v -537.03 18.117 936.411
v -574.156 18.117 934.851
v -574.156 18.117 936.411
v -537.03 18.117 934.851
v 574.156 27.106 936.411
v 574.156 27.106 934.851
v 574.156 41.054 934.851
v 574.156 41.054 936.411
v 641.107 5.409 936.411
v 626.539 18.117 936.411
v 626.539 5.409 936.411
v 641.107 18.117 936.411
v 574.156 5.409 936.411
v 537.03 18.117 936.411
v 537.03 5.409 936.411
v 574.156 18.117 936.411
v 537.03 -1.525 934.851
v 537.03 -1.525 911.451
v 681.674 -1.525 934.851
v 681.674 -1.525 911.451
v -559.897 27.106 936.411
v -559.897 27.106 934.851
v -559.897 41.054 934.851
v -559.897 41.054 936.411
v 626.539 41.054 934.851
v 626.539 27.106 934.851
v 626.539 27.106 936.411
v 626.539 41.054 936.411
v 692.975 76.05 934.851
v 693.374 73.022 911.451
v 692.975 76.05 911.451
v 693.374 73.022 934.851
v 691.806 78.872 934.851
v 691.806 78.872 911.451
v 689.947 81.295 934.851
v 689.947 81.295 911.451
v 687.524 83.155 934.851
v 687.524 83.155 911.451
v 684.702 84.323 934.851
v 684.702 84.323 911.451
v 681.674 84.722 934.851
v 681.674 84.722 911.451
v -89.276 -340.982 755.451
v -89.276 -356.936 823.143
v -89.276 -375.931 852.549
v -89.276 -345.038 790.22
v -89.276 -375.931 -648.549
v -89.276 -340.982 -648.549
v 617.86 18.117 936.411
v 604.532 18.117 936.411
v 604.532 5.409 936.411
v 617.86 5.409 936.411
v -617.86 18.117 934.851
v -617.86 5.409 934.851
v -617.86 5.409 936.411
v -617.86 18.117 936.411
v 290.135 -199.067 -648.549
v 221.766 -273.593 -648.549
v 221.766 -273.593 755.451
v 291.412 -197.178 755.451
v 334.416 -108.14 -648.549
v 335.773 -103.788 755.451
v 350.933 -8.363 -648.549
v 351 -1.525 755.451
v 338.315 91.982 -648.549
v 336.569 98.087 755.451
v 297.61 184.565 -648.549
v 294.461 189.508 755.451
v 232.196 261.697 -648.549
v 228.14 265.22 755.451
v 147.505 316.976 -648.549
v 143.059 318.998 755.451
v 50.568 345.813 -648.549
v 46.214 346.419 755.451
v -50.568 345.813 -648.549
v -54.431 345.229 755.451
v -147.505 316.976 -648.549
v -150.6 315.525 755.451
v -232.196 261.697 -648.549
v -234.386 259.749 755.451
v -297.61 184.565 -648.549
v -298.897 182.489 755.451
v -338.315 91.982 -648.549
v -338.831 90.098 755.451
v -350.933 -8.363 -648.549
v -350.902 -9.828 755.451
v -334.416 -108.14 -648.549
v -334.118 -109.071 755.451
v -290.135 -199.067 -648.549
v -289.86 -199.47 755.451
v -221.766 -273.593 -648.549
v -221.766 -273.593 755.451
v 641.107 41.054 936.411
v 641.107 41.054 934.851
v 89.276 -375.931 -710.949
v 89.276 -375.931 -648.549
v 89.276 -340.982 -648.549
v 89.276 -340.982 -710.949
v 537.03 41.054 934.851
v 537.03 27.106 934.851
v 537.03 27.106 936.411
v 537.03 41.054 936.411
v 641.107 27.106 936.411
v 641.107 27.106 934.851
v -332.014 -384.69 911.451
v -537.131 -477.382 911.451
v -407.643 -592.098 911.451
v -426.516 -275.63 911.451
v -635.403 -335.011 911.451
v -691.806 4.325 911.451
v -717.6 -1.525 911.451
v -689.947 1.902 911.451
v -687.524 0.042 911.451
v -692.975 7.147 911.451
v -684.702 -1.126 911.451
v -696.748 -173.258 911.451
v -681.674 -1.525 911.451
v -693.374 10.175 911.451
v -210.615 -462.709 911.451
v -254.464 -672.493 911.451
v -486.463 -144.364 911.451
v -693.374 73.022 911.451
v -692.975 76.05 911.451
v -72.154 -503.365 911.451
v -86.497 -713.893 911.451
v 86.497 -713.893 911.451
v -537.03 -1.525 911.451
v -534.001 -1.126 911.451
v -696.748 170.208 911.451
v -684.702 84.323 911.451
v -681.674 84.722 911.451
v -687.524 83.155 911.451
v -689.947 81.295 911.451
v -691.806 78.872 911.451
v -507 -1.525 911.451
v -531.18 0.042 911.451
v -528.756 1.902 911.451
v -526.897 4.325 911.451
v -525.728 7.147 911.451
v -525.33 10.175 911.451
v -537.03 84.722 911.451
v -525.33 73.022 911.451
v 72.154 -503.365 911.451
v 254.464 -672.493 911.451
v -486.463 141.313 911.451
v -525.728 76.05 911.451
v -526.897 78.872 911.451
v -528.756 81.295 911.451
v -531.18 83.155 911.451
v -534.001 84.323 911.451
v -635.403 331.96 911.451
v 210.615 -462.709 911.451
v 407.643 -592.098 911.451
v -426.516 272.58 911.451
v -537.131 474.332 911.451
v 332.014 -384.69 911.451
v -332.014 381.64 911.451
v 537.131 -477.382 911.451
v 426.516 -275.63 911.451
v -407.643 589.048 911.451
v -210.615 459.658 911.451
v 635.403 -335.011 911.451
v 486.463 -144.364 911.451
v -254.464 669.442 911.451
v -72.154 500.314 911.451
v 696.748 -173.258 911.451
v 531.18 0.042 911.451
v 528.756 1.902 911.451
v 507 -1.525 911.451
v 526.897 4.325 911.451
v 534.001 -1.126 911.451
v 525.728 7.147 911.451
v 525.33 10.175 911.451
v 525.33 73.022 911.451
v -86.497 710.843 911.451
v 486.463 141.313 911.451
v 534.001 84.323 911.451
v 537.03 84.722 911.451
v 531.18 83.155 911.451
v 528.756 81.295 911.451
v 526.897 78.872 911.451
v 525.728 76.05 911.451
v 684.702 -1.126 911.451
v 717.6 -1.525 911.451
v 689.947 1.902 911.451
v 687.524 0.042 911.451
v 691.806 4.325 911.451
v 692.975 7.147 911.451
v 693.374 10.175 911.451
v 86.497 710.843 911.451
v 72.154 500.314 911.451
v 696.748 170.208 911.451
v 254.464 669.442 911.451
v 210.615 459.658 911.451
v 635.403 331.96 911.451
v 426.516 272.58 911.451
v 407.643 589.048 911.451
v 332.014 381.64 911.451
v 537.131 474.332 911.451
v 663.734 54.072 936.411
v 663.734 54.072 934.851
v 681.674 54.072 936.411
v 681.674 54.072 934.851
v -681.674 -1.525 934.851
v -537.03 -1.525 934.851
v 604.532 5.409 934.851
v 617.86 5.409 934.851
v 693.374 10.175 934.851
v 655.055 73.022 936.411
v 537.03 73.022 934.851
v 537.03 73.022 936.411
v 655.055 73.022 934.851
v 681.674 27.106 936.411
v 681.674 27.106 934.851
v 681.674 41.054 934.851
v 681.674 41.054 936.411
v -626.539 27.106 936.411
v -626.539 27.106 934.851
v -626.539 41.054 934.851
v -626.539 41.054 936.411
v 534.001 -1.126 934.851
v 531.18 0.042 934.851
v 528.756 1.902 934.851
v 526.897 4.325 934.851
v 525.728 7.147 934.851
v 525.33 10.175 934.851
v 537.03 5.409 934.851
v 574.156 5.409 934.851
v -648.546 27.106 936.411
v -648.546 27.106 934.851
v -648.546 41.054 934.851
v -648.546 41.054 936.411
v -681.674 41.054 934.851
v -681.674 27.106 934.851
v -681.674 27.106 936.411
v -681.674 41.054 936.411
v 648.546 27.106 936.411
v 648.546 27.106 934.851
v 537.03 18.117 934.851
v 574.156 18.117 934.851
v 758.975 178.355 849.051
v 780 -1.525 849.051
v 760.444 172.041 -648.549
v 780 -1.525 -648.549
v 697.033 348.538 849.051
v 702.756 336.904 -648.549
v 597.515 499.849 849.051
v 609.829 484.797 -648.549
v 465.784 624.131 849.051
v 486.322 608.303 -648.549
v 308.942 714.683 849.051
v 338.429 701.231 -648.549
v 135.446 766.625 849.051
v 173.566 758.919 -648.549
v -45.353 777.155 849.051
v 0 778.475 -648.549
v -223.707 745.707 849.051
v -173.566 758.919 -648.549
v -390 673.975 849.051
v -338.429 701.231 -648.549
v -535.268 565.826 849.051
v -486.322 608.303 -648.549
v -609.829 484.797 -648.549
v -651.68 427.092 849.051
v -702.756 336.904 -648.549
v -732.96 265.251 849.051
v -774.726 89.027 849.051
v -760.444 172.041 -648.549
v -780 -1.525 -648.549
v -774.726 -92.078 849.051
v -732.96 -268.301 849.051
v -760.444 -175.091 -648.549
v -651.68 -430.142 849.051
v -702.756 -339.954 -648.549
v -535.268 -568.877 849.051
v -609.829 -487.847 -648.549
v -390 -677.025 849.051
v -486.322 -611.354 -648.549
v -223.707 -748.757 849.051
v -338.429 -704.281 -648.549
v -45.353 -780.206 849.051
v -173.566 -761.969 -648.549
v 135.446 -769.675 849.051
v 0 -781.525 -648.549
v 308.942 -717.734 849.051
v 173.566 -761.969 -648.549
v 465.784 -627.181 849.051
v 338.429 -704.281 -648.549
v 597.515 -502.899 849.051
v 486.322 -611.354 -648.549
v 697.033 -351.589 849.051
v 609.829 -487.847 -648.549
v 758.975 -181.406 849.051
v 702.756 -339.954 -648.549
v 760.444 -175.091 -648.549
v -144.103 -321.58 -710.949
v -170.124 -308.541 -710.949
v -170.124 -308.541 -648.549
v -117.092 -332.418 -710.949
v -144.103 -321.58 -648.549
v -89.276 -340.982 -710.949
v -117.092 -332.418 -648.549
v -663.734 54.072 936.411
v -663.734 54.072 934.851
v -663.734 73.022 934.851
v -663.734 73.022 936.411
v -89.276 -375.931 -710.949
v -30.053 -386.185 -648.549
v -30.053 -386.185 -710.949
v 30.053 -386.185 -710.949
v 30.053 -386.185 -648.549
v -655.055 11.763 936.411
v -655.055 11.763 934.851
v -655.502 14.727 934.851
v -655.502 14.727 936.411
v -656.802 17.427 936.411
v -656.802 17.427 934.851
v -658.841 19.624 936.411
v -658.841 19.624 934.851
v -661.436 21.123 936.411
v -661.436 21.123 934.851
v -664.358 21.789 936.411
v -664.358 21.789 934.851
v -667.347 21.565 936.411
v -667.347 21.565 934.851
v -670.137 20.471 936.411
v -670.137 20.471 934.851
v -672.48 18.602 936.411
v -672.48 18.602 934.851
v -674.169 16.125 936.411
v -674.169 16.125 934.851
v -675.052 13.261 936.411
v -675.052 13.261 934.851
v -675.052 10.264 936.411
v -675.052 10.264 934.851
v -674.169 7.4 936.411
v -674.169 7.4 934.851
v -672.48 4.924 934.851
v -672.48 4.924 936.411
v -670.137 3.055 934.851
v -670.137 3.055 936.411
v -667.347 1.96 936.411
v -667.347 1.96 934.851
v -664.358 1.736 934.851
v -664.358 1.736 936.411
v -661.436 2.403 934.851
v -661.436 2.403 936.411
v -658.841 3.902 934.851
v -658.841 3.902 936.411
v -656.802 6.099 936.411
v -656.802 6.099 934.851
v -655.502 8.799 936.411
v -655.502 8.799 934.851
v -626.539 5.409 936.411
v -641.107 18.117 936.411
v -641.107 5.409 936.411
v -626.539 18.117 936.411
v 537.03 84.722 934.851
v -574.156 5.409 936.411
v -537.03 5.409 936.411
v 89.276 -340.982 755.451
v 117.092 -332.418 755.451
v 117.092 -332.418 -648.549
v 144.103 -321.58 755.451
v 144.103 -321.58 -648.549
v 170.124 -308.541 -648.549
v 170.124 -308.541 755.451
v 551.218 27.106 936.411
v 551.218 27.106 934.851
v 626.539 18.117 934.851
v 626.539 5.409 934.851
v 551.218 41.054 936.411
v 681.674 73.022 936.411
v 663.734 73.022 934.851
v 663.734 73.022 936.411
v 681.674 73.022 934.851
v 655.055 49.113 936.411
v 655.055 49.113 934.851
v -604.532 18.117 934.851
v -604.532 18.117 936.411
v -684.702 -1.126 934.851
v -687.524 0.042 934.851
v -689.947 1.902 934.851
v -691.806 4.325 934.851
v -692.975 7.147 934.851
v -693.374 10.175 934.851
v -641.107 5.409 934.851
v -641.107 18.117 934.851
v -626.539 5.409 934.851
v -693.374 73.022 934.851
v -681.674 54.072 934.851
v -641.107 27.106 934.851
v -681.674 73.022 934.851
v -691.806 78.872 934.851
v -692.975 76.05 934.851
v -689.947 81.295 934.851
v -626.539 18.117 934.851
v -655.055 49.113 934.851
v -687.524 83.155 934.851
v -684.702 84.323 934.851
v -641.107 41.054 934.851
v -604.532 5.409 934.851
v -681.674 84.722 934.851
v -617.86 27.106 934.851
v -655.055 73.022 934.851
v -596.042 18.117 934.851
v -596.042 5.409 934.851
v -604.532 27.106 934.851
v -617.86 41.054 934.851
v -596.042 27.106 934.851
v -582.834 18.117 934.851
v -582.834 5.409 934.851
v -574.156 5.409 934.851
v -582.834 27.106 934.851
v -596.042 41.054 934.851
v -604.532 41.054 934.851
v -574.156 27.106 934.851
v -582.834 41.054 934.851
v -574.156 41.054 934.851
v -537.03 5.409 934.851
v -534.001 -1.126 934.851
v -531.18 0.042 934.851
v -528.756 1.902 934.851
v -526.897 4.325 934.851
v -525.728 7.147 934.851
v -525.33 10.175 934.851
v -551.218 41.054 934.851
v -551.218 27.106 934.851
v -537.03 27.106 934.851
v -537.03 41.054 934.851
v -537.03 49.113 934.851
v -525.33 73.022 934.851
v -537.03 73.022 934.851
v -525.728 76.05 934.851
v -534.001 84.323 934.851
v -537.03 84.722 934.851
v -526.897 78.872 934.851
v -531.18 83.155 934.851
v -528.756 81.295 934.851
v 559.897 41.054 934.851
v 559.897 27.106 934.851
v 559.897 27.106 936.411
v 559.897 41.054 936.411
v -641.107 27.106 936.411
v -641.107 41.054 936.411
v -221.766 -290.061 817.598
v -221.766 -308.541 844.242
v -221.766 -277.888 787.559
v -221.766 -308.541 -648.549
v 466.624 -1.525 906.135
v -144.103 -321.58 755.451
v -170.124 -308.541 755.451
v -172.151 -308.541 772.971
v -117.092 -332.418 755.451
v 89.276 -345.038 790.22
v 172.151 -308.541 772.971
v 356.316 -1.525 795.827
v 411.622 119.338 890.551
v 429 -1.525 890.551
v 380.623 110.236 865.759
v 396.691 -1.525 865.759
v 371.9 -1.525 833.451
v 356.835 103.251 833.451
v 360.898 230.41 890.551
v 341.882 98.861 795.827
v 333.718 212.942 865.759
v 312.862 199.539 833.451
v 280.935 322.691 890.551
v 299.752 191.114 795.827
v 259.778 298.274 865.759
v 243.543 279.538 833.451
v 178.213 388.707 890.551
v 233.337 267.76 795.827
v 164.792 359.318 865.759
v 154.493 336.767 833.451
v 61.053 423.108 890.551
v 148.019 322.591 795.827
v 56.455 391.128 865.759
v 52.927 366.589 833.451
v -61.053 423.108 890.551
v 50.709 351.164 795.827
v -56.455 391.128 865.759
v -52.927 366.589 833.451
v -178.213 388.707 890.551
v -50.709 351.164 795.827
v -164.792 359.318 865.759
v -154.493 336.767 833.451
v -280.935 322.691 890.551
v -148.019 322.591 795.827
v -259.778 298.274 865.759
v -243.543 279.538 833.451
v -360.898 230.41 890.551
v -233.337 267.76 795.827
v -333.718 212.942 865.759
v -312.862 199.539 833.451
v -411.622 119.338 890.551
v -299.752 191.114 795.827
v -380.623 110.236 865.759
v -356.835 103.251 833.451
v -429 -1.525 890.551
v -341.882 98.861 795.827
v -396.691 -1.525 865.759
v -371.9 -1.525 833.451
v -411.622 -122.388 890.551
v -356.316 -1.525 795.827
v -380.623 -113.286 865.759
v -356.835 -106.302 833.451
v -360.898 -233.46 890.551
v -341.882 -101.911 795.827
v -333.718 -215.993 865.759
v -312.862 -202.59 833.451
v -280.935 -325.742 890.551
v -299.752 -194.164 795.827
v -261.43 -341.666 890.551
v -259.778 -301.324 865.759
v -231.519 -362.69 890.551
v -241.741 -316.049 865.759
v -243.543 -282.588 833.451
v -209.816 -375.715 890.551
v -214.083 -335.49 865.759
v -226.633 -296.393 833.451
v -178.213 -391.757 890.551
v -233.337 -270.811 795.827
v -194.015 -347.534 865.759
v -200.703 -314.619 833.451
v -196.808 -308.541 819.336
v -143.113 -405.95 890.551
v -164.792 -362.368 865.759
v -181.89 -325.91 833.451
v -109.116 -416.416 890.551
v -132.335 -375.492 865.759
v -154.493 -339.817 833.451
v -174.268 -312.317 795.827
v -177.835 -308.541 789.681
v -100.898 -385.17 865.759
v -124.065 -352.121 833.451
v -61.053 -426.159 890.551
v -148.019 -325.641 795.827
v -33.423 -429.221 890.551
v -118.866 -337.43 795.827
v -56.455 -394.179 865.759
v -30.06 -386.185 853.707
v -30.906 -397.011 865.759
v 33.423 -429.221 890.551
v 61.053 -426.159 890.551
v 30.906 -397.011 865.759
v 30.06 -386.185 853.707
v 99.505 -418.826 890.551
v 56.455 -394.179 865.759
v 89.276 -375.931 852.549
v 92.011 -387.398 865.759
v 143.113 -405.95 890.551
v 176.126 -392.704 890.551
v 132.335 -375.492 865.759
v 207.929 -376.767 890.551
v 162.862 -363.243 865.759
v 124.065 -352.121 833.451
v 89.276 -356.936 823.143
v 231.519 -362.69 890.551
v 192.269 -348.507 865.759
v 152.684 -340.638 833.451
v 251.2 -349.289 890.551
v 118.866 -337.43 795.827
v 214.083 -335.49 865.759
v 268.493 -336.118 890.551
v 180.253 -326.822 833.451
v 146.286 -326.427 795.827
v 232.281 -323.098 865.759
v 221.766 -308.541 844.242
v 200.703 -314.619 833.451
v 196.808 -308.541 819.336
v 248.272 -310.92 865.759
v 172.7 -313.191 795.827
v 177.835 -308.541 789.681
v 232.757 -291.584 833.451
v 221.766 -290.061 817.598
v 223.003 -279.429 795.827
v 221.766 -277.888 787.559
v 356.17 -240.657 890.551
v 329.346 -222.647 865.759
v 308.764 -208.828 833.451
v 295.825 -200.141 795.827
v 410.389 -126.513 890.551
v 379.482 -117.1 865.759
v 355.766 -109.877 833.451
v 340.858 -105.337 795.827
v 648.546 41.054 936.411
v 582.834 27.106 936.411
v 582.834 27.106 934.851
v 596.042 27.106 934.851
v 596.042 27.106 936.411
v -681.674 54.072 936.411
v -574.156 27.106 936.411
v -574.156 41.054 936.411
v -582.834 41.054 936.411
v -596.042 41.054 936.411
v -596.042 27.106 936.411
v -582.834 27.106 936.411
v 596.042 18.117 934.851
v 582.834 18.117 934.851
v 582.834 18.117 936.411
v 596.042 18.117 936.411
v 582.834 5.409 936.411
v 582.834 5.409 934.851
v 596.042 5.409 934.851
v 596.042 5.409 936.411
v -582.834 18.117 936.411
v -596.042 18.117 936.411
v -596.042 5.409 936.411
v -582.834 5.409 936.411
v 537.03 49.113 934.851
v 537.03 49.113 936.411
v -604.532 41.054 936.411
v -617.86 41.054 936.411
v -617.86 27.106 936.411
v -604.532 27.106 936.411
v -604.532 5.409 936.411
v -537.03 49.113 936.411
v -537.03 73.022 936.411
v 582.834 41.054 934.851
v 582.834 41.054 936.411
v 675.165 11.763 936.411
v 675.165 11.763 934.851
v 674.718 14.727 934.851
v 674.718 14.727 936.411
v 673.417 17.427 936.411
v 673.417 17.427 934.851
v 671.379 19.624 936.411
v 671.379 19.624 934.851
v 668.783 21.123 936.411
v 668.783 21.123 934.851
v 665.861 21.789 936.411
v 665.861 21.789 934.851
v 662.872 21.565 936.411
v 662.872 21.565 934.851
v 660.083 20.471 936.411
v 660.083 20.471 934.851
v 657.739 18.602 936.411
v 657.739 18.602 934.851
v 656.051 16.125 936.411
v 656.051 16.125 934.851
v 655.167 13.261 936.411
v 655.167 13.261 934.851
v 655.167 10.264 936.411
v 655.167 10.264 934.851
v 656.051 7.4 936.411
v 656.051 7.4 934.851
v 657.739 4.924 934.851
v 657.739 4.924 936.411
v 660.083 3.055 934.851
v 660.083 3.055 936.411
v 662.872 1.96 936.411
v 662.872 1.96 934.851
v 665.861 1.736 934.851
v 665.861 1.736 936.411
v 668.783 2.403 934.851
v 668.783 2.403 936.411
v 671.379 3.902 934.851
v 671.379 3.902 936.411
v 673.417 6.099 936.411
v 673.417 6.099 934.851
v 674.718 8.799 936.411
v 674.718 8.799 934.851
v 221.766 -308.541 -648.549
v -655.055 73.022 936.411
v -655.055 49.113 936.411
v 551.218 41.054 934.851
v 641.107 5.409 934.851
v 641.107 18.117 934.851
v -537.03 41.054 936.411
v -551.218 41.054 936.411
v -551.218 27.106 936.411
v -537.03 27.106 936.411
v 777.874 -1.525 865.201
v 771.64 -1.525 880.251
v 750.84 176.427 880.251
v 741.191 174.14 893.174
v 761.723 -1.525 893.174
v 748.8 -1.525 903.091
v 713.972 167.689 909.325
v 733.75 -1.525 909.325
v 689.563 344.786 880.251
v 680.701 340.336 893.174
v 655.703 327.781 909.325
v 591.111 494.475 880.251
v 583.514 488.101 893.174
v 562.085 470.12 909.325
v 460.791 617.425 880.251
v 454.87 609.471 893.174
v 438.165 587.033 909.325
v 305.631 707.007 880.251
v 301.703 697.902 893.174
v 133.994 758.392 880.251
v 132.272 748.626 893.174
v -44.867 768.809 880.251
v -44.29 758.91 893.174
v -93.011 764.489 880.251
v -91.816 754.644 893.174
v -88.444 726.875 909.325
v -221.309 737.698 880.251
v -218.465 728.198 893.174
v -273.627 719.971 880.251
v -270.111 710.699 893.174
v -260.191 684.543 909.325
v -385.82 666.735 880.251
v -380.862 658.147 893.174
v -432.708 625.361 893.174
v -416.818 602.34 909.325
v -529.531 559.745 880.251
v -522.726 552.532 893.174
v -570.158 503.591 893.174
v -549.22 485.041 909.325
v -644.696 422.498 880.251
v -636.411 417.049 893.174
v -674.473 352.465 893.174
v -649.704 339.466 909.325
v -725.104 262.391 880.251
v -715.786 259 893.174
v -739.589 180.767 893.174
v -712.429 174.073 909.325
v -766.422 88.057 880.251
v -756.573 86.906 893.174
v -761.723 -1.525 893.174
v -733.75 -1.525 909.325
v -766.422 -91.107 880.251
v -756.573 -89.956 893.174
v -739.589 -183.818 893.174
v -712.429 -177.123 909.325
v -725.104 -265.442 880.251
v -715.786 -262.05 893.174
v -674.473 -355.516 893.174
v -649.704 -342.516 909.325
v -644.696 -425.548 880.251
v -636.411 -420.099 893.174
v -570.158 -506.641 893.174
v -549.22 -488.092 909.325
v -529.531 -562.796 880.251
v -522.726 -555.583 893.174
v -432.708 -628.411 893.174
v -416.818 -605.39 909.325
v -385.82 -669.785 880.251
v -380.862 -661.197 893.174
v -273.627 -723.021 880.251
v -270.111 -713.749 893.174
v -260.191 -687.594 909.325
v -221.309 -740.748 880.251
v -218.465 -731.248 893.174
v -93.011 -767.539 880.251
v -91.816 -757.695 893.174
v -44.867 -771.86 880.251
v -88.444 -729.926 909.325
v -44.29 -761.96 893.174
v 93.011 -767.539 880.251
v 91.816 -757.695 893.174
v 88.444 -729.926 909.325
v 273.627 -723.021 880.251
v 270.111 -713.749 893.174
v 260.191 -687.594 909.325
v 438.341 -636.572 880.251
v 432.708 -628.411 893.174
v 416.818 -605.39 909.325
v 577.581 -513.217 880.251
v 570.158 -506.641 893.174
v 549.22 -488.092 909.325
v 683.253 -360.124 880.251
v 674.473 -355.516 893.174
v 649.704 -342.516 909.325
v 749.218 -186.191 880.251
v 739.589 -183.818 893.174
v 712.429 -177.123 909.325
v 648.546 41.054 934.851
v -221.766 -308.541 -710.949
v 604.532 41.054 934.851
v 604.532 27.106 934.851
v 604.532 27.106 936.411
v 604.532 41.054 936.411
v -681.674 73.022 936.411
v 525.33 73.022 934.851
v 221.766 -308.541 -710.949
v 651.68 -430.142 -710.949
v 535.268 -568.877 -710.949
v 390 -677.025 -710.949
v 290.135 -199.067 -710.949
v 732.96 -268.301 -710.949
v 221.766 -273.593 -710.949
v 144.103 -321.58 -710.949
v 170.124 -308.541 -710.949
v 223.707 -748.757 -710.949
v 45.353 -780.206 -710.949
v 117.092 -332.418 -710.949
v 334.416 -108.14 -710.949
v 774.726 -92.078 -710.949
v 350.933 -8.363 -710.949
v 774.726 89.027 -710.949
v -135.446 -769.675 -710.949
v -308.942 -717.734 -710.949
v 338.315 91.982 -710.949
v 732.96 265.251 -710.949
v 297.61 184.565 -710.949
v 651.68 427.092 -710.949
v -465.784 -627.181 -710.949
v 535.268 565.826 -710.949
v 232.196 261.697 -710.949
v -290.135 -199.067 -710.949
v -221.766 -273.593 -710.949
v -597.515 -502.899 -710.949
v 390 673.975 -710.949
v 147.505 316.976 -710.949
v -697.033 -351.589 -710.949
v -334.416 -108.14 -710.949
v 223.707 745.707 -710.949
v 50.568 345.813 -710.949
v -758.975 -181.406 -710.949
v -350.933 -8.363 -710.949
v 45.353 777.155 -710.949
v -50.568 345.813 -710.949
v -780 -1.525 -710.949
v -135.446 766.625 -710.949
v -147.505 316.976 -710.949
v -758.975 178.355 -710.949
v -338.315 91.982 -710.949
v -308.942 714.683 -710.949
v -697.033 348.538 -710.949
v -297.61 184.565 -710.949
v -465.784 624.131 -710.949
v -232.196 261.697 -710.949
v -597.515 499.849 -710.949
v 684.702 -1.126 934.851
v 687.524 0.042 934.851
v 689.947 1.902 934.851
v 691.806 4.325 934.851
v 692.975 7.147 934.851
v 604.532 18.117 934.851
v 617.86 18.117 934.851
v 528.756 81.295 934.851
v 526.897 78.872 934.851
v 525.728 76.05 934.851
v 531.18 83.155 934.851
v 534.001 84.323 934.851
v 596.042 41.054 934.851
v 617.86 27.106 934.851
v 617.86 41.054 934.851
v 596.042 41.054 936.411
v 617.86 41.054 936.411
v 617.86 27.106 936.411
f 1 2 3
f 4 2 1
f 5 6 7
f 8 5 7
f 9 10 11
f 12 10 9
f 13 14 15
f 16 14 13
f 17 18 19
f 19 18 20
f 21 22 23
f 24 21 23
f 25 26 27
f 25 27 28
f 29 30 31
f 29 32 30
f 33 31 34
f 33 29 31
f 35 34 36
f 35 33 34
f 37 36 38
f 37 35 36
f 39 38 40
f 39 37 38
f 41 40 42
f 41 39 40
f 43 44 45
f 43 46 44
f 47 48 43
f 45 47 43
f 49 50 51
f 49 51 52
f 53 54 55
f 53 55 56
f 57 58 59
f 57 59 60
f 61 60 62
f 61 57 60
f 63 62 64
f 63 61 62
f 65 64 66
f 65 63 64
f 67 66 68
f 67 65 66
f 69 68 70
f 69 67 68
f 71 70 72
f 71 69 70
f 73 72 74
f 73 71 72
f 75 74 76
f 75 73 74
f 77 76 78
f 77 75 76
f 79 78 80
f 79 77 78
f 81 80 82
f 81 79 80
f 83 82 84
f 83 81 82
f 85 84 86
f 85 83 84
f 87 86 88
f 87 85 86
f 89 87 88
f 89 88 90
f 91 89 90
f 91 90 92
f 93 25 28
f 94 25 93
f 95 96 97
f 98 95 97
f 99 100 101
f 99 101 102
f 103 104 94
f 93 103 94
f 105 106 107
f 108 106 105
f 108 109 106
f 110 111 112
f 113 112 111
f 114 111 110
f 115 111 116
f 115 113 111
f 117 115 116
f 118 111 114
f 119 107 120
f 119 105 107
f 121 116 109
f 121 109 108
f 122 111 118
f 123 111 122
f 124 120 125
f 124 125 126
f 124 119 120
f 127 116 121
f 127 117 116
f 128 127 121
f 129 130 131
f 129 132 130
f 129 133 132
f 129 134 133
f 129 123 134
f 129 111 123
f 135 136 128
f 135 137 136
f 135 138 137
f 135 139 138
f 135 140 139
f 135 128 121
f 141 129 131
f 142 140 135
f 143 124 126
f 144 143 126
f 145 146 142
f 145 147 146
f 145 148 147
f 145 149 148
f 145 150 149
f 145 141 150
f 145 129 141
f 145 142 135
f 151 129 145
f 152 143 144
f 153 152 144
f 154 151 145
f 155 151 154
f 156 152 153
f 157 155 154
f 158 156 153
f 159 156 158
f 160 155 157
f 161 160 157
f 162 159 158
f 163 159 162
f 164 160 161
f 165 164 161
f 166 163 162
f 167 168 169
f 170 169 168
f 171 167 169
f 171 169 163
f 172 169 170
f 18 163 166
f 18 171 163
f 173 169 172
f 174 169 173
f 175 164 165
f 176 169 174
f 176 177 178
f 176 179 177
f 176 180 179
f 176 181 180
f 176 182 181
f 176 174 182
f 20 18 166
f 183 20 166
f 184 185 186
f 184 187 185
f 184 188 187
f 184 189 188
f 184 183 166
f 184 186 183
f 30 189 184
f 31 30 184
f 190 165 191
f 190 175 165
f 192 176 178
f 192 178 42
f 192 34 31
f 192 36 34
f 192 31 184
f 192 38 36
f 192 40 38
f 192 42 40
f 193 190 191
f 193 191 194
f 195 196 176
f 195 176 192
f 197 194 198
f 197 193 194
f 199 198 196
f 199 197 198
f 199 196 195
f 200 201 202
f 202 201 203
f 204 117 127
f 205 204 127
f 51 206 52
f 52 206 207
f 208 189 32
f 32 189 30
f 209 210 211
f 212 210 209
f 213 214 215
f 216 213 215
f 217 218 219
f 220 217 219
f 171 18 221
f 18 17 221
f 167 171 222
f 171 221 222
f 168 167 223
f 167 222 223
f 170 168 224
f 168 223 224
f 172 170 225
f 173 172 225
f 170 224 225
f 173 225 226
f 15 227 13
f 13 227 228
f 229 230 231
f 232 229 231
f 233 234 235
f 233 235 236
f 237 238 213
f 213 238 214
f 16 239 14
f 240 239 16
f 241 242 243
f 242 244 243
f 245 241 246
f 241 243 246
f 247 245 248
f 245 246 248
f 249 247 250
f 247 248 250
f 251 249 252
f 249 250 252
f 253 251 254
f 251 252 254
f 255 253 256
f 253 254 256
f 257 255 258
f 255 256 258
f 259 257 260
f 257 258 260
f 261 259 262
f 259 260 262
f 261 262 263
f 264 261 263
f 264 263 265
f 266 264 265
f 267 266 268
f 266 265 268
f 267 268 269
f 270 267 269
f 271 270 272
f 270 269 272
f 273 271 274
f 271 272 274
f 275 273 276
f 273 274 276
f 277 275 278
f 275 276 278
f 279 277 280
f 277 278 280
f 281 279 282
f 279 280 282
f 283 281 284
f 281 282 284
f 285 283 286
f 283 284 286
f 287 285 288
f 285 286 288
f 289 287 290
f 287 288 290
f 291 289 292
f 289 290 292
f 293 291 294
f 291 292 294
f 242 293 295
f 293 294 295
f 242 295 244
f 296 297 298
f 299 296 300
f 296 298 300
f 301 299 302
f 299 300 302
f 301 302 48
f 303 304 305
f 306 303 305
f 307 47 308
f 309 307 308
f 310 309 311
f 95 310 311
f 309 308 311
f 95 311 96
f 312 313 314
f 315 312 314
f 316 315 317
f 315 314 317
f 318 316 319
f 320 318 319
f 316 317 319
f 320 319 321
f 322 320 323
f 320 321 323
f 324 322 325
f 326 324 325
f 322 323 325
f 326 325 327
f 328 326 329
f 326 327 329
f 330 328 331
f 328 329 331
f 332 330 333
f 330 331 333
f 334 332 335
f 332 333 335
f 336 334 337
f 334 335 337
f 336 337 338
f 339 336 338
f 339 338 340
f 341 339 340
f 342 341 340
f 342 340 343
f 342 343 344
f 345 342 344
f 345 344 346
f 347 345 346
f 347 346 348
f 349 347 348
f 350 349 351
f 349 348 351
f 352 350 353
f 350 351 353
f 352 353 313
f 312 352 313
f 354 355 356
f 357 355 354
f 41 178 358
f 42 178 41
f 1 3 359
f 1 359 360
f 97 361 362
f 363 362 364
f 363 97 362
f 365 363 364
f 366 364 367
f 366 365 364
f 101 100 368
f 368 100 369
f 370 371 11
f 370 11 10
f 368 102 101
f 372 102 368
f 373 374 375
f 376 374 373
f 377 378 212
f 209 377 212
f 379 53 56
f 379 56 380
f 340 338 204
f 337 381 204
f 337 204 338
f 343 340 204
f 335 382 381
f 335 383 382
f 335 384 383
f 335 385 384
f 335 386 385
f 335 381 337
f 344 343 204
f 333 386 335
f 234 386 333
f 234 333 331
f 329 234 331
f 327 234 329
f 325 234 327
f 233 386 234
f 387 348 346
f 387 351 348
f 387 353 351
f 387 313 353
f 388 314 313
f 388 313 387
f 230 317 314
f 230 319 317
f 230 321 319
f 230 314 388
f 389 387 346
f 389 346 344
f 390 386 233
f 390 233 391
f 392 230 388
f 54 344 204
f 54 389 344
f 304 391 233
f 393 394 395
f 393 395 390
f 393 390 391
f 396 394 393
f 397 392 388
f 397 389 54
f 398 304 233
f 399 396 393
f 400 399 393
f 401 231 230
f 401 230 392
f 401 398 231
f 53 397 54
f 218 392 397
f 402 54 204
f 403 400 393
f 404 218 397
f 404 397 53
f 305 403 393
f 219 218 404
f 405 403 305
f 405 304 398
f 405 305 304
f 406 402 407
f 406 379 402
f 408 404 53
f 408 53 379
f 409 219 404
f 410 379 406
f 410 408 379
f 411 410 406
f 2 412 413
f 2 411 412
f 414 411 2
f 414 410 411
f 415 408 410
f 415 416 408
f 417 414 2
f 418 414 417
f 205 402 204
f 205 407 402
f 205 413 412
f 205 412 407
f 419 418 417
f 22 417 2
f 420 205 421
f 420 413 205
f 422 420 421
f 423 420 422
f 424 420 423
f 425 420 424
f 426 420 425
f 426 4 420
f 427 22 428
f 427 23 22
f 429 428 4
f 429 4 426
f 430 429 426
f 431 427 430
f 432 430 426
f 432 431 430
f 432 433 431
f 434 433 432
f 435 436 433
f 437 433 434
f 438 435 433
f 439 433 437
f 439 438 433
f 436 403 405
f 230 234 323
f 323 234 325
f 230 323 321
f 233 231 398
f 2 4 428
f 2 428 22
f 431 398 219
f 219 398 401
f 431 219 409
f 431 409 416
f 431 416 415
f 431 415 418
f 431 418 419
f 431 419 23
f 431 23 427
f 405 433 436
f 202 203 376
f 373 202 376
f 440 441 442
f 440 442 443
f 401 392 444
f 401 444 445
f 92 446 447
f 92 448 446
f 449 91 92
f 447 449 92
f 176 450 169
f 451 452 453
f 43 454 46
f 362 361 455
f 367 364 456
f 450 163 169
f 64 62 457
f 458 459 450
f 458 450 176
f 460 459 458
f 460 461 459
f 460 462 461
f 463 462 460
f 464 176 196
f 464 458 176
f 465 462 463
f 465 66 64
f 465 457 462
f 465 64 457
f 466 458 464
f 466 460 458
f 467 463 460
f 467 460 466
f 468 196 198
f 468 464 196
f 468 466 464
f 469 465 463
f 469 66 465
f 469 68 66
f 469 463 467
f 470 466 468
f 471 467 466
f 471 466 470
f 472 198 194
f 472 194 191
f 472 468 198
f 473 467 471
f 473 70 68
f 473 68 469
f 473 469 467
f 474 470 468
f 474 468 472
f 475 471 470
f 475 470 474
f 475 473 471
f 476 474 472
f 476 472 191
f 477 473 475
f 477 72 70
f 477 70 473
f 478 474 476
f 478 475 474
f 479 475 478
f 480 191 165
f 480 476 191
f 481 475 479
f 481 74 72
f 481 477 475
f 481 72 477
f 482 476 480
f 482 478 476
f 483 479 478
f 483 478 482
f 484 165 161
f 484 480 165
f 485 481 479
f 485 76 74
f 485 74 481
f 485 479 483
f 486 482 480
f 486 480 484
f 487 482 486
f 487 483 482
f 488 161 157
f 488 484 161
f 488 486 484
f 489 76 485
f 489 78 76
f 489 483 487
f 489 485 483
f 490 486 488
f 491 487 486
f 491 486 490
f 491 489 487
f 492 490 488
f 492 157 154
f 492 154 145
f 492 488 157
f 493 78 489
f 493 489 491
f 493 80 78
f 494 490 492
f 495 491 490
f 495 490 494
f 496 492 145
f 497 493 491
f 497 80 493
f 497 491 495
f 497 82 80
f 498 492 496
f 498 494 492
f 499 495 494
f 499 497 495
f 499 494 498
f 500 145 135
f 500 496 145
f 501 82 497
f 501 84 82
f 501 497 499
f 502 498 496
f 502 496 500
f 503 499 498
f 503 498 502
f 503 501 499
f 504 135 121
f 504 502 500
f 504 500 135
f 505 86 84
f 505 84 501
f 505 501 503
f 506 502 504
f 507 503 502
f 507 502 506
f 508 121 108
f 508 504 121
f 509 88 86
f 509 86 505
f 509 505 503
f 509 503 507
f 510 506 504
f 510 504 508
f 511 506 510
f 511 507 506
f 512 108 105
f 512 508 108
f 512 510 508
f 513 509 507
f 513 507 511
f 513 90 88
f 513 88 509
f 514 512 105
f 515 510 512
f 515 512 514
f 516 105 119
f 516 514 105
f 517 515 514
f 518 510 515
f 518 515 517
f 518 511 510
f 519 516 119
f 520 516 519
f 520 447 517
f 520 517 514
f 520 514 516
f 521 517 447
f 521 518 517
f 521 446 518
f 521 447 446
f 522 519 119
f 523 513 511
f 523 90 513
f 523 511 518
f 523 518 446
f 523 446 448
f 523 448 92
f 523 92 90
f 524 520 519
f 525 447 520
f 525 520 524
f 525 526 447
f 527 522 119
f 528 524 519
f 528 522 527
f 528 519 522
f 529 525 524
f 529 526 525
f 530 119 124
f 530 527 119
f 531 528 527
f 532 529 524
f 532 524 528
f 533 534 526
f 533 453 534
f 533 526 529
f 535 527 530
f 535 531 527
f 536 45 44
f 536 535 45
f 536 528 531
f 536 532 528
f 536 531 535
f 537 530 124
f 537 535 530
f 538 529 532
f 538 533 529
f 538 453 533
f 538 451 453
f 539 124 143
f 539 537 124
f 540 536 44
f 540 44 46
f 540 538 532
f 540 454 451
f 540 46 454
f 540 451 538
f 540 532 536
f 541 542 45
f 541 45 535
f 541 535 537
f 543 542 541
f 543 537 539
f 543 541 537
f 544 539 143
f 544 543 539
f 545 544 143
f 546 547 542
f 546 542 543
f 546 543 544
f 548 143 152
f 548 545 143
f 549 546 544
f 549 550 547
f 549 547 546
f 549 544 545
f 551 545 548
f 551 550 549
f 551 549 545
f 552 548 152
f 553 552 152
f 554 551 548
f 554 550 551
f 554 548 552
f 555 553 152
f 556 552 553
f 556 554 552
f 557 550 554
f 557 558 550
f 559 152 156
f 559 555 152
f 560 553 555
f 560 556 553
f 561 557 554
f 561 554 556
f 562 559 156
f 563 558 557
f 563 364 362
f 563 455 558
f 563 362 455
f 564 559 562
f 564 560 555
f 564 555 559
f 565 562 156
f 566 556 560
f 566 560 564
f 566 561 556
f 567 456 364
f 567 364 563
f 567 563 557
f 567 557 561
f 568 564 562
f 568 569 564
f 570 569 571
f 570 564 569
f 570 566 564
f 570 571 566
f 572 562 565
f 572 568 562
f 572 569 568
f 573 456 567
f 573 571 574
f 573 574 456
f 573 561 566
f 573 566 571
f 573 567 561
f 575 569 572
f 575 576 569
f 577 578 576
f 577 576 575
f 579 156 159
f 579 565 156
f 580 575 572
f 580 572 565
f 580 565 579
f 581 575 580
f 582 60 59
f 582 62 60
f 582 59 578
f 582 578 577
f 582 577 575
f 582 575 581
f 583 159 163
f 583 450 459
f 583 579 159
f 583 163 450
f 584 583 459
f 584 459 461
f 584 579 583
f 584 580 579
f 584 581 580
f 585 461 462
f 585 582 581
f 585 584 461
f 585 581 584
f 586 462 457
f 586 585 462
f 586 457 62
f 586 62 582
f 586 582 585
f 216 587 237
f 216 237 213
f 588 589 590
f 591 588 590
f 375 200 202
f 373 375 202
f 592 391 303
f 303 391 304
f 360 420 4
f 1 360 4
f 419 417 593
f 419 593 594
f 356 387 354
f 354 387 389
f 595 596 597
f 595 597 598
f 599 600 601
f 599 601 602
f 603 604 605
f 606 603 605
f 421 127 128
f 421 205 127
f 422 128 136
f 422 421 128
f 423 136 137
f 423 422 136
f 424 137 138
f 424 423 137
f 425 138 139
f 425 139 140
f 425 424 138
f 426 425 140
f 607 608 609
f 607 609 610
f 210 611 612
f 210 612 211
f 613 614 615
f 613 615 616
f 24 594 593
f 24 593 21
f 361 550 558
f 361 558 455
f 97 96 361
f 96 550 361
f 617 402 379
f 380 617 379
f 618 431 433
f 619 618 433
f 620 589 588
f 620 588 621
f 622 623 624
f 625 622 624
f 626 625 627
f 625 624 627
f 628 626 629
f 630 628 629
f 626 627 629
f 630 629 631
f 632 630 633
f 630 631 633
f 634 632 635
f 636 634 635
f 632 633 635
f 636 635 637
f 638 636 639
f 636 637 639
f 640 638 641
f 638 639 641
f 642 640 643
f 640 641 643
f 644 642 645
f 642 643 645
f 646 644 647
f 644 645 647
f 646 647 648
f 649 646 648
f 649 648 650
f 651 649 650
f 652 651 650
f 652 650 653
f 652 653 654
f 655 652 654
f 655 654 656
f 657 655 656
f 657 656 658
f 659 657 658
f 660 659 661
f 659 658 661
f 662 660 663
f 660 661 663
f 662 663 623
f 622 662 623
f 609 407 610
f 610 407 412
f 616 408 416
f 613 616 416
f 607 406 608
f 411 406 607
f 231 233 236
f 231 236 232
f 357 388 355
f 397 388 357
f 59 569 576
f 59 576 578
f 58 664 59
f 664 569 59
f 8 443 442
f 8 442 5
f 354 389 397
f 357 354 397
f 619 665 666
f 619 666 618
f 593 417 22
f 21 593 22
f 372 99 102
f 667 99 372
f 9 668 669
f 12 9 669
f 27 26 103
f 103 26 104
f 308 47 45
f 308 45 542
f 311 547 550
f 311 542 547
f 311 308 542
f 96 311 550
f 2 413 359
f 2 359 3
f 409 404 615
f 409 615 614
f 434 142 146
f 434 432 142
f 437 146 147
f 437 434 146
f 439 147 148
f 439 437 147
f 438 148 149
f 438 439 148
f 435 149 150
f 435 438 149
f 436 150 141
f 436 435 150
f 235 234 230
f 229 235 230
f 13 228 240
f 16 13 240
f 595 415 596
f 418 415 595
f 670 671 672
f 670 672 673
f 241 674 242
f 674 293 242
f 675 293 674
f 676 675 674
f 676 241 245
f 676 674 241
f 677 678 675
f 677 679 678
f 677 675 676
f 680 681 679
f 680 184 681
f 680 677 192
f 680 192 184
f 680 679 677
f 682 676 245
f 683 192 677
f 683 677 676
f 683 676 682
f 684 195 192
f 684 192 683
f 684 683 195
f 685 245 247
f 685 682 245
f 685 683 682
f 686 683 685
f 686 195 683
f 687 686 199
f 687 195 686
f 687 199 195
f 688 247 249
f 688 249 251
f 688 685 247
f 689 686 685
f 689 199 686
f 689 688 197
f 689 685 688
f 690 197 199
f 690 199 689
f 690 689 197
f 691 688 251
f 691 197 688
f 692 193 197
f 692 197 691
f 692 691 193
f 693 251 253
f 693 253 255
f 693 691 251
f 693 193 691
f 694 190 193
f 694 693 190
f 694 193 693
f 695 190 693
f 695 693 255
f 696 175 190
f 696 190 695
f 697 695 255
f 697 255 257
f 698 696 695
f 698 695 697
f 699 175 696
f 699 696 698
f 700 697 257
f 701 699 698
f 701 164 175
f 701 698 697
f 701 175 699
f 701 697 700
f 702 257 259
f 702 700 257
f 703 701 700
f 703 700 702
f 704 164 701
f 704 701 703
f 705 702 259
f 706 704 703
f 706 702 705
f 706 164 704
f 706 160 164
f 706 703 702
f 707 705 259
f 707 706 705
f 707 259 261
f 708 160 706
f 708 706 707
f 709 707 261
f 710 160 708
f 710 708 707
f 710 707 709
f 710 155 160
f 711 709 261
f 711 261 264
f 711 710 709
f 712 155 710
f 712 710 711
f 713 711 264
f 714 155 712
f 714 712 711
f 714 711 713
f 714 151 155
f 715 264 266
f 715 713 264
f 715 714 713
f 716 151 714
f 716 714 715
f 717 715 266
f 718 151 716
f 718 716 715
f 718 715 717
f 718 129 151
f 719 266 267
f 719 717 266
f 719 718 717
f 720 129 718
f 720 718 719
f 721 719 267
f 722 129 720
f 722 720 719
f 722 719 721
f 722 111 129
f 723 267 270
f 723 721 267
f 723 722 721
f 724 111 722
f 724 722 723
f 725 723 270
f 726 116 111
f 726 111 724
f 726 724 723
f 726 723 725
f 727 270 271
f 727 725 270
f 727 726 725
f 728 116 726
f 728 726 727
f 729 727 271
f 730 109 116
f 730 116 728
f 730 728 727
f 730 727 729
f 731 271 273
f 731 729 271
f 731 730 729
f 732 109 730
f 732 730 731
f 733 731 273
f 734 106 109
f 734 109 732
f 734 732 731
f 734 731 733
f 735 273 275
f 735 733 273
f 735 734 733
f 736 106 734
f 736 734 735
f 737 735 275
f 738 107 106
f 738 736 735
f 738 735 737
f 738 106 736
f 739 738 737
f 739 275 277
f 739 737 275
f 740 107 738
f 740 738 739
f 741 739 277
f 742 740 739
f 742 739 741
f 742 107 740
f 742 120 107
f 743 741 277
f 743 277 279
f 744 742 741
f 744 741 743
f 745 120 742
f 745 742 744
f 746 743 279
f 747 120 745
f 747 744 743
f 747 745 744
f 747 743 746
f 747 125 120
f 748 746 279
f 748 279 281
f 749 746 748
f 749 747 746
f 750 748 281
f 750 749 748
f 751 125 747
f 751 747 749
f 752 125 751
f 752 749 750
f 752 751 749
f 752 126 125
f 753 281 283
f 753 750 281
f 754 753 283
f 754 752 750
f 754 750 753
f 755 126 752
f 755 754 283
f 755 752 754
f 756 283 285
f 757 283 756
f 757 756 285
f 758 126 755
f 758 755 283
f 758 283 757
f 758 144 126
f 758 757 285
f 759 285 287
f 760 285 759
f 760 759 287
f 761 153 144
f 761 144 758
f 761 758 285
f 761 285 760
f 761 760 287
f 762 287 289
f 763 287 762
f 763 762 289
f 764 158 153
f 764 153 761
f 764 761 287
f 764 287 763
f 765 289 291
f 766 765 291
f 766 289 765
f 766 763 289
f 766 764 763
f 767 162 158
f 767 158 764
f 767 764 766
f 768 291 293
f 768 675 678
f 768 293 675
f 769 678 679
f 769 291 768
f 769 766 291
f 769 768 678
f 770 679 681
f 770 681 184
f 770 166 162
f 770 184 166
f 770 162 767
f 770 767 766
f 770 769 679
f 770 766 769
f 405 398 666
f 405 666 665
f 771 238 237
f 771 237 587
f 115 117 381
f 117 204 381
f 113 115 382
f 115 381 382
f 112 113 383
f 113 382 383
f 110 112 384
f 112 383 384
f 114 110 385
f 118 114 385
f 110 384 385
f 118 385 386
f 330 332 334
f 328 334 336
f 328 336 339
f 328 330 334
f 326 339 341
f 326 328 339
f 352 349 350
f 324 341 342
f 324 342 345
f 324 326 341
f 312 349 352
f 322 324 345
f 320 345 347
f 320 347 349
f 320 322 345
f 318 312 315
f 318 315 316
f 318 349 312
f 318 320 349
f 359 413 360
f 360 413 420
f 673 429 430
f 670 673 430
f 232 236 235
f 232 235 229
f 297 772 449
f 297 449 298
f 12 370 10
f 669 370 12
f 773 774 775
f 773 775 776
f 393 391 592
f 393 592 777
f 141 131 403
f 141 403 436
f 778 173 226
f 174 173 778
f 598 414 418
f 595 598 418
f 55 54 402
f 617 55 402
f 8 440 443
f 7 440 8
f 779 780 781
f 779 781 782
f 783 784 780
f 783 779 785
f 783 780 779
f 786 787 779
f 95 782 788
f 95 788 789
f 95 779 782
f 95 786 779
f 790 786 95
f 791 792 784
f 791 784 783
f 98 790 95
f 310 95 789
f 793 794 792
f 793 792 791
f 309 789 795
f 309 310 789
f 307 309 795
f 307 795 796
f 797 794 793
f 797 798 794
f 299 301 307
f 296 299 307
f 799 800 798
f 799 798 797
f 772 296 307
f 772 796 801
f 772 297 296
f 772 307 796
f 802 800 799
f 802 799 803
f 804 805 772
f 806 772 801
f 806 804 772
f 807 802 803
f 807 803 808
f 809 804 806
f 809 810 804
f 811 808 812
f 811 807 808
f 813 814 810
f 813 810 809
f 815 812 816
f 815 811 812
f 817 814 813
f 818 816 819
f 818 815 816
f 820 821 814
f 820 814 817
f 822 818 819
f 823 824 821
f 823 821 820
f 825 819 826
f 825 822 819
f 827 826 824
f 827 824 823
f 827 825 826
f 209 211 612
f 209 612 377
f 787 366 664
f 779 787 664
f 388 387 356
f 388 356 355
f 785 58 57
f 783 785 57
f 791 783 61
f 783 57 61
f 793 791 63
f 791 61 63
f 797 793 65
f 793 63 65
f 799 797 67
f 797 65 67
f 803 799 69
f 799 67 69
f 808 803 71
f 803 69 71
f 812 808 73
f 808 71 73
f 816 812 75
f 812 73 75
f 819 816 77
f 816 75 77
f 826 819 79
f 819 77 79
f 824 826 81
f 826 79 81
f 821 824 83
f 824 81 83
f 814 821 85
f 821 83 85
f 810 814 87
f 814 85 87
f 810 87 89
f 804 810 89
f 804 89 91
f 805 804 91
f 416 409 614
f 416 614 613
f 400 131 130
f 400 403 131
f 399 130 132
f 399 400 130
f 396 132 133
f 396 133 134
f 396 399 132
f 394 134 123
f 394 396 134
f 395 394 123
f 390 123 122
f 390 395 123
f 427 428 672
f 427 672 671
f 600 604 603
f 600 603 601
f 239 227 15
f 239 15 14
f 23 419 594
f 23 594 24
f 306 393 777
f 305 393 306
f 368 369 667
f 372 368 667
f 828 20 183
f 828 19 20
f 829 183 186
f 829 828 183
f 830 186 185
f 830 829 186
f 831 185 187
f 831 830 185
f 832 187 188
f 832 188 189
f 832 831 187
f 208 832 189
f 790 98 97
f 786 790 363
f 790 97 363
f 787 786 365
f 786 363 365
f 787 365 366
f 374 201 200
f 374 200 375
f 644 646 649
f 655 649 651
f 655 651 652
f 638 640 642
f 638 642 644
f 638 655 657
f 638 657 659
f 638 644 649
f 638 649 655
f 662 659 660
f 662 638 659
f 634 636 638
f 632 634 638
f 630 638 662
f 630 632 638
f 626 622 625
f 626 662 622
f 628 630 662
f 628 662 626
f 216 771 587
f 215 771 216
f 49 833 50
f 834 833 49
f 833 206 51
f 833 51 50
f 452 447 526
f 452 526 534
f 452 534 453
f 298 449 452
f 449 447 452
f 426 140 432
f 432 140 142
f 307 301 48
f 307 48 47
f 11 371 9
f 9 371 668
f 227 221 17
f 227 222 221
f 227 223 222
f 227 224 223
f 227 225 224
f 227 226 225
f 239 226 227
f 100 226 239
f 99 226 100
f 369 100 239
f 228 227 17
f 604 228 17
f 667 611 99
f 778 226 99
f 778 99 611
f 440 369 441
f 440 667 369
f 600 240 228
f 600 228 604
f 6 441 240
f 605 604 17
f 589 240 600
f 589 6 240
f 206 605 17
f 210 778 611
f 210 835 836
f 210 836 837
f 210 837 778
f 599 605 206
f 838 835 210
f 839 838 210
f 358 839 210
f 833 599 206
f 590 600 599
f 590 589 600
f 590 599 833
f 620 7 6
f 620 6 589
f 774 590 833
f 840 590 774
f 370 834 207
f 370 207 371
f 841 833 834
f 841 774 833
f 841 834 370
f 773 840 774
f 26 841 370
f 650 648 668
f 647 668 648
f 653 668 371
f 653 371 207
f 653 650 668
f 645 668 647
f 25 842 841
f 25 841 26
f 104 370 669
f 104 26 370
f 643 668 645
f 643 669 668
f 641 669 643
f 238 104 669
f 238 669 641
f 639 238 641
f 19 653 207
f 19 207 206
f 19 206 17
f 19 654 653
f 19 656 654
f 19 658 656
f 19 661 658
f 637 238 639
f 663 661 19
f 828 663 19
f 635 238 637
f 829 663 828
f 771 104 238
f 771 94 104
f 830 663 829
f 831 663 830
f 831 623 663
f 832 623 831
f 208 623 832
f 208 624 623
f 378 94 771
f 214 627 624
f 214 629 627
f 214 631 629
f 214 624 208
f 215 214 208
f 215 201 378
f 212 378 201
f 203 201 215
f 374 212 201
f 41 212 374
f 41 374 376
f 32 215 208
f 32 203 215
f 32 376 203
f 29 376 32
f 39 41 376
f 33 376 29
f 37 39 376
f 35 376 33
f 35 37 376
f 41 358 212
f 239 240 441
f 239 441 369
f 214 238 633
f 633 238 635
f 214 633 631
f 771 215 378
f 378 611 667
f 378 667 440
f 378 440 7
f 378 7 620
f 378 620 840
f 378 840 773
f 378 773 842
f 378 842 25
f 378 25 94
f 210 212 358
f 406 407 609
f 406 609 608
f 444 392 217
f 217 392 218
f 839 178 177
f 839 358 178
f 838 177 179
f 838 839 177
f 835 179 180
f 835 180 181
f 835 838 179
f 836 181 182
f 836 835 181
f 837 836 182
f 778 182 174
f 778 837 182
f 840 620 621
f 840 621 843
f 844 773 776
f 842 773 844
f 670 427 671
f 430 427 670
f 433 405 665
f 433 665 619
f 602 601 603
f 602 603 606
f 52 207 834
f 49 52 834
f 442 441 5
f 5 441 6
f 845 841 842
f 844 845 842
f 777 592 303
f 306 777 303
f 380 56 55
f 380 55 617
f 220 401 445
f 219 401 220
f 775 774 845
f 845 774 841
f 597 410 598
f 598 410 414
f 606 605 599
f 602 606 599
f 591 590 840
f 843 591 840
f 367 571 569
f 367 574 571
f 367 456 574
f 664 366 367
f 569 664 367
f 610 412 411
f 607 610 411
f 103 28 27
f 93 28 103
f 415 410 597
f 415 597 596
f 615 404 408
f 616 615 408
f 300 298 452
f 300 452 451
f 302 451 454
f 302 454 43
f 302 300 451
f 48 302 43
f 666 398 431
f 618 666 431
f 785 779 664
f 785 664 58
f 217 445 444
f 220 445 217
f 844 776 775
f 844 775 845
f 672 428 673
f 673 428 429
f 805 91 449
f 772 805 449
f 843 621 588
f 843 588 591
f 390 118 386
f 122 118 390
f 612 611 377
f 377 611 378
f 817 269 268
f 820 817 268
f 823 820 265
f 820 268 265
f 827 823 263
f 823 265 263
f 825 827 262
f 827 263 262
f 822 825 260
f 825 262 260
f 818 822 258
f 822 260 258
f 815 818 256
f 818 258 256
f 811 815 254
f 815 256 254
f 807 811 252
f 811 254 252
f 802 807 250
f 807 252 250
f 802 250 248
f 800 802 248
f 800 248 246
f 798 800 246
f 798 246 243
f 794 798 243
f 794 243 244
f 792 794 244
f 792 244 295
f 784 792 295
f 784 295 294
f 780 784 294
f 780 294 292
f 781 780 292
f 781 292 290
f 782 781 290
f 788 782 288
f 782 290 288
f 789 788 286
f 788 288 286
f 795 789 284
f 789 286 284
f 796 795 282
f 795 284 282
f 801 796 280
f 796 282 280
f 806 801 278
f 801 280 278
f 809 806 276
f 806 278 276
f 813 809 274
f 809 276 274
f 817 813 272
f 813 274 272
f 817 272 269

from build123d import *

# Parameters (mm, degrees)
SKETCH1_R           = 100
SKETCH1_R_2         = 45
BOSS_EXTRUDE1_DEPTH = 200
FILLET1_R           = 8
FILLET2_R           = 20
CUT_EXTRUDE1_DEPTH  = 200
SKETCH3_W           = 21.544123994
SKETCH3_H           = 11.057339859
BOSS_EXTRUDE2_DEPTH = 3
FILLET3_R           = 1.5
SKETCH4_R           = 1.289060933
SKETCH4_W           = 15.13149362
SKETCH4_H           = 3.065252971
SKETCH4_W_2         = 2.299952362
SKETCH4_H_2         = 2.429436964
SKETCH4_W_3         = 1.819095979
SKETCH4_H_3         = 1.788232519
SKETCH4_W_4         = 1.827971019
SKETCH4_W_5         = 1.693323788
SKETCH4_W_6         = 1.708755518
SKETCH4_W_7         = 1.86770952
SKETCH4_W_8         = 4.247138883
SKETCH4_W_9         = 4.75974501
SKETCH4_H_4         = 1.629278517
BOSS_EXTRUDE3_DEPTH = 0.2
SKETCH5_R           = 100
BOSS_EXTRUDE4_DEPTH = 8
SCALE1_SCALE        = 15.6
SCALE2_SCALE        = 0.5


with BuildPart() as part:
    # Sketch1 → Boss-Extrude1 (new body)
    with BuildSketch(Plane.XY):
        Circle(SKETCH1_R)
        Circle(SKETCH1_R_2, mode=Mode.SUBTRACT)
    extrude(amount=BOSS_EXTRUDE1_DEPTH)

    # Fillet1
    fillet1_edges = [part.edges().sort_by_distance(p)[0] for p in [
        (-100, 0, 200),
    ]]
    fillet(fillet1_edges, radius=FILLET1_R)

    # Fillet2
    fillet2_edges = [part.edges().sort_by_distance(p)[0] for p in [
        (-45, 0, 200),
    ]]
    fillet(fillet2_edges, radius=FILLET2_R)

    # Sketch2 → Cut-Extrude1 (cut)
    with BuildSketch(Plane(origin=(0, 0, 0), x_dir=(-1, 0, 0), z_dir=(0, 0, -1))):
        with BuildLine():
            Line((-28.43159427, -34.880430721), (28.43159427, -34.880430721))
            Line((28.43159427, -34.880430721), (28.43159427, -39.361060603))
            Line((28.43159427, -39.361060603), (11.44568617, -39.361060603))
            Line((11.44568617, -39.361060603), (11.44568617, -48.0006973))
            ThreePointArc((11.44568617, -48.0006973), (0, -49.480629882), (-11.44568617, -48.0006973))
            Line((-11.44568617, -48.0006973), (-11.44568617, -39.361060603))
            Line((-11.44568617, -39.361060603), (-28.43159427, -39.361060603))
            Line((-28.43159427, -39.361060603), (-28.43159427, -34.880430721))
        make_face()
    extrude(amount=-CUT_EXTRUDE1_DEPTH, mode=Mode.SUBTRACT)

    # Sketch3 → Boss-Extrude2 (add)
    with BuildSketch(Plane.XY.offset(200)):
        with Locations((78.121999913, 5.52866993)):
            Rectangle(SKETCH3_W, SKETCH3_H)
        with Locations((-78.121999913, 5.52866993)):
            Rectangle(SKETCH3_W, SKETCH3_H)
    extrude(amount=BOSS_EXTRUDE2_DEPTH)

    # Fillet3
    fillet3_edges = [part.edges().sort_by_distance(p)[0] for p in [
        (67.349937916, 11.057339859, 201.5),
        (67.349937916, 0, 201.5),
        (88.89406191, 0, 201.5),
        (88.89406191, 11.057339859, 201.5),
        (-88.89406191, 0, 201.5),
        (-67.349937916, 0, 201.5),
        (-67.349937916, 11.057339859, 201.5),
        (-88.89406191, 11.057339859, 201.5),
    ]]
    fillet(fillet3_edges, radius=FILLET3_R)

    # Sketch4 → Boss-Extrude3 (add)
    with BuildSketch(Plane.XY.offset(203)):
        with Locations((85.270492468, 1.703597588)):
            Circle(SKETCH4_R)
        with Locations((-85.270492468, 1.703597588)):
            Circle(SKETCH4_R)
        with Locations((76.415684726, 8.024713374)):
            Rectangle(SKETCH4_W, SKETCH4_H)
        with Locations((86.244085729, 8.342621377)):
            Rectangle(SKETCH4_W_2, SKETCH4_H_2)
        with Locations((69.759485906, 4.564769617)):
            Rectangle(SKETCH4_W_3, SKETCH4_H_3)
        with Locations((72.695697416, 4.564769617)):
            Rectangle(SKETCH4_W_4, SKETCH4_H_3)
        with Locations((75.569022832, 4.564769617)):
            Rectangle(SKETCH4_W_5, SKETCH4_H_3)
        with Locations((78.358433726, 4.564769617)):
            Rectangle(SKETCH4_W_6, SKETCH4_H_3)
        with Locations((81.259344257, 4.564769617)):
            Rectangle(SKETCH4_W_7, SKETCH4_H_3)
        with Locations((85.270492469, 4.564769617)):
            Rectangle(SKETCH4_W_8, SKETCH4_H_3)
        with Locations((71.229810421, 1.703597588)):
            Rectangle(SKETCH4_W_9, SKETCH4_H_4)
        with Locations((75.569022832, 1.703597588)):
            Rectangle(SKETCH4_W_5, SKETCH4_H_4)
        with Locations((78.358433726, 1.703597588)):
            Rectangle(SKETCH4_W_6, SKETCH4_H_4)
        with Locations((81.259344257, 1.703597588)):
            Rectangle(SKETCH4_W_7, SKETCH4_H_4)
        with Locations((-81.259344257, 1.703597588)):
            Rectangle(SKETCH4_W_7, SKETCH4_H_4)
        with Locations((-78.358433726, 1.703597588)):
            Rectangle(SKETCH4_W_6, SKETCH4_H_4)
        with Locations((-75.569022832, 1.703597588)):
            Rectangle(SKETCH4_W_5, SKETCH4_H_4)
        with Locations((-71.229810421, 1.703597588)):
            Rectangle(SKETCH4_W_9, SKETCH4_H_4)
        with Locations((-85.270492469, 4.564769617)):
            Rectangle(SKETCH4_W_8, SKETCH4_H_3)
        with Locations((-81.259344257, 4.564769617)):
            Rectangle(SKETCH4_W_7, SKETCH4_H_3)
        with Locations((-78.358433726, 4.564769617)):
            Rectangle(SKETCH4_W_6, SKETCH4_H_3)
        with Locations((-75.569022832, 4.564769617)):
            Rectangle(SKETCH4_W_5, SKETCH4_H_3)
        with Locations((-72.695697416, 4.564769617)):
            Rectangle(SKETCH4_W_4, SKETCH4_H_3)
        with Locations((-69.759485906, 4.564769617)):
            Rectangle(SKETCH4_W_3, SKETCH4_H_3)
        with Locations((-86.244085729, 8.342621377)):
            Rectangle(SKETCH4_W_2, SKETCH4_H_2)
        with Locations((-76.415684726, 8.024713374)):
            Rectangle(SKETCH4_W, SKETCH4_H)
    extrude(amount=BOSS_EXTRUDE3_DEPTH)

    # Sketch5 → Boss-Extrude4 (add)
    with BuildSketch(Plane(origin=(0, 0, 0), x_dir=(-1, 0, 0), z_dir=(0, 0, -1))):
        Circle(SKETCH5_R)
        with BuildLine():
            Line((-28.43159427, -39.361060603), (-28.43159427, -34.880430721))
            ThreePointArc((-28.43159427, -34.880430721), (0, 45), (28.43159427, -34.880430721))
            Line((28.43159427, -34.880430721), (28.43159427, -39.361060603))
            Line((28.43159427, -39.361060603), (21.810706275, -39.361060603))
            ThreePointArc((21.810706275, -39.361060603), (16.757721923, -41.763366195), (11.44568617, -43.520067418))
            Line((11.44568617, -43.520067418), (11.44568617, -45.760382359))
            Line((11.44568617, -45.760382359), (11.44568617, -48.0006973))
            ThreePointArc((11.44568617, -48.0006973), (0, -49.480629882), (-11.44568617, -48.0006973))
            Line((-11.44568617, -48.0006973), (-11.44568617, -43.520067418))
            ThreePointArc((-11.44568617, -43.520067418), (-16.757721923, -41.763366195), (-21.810706275, -39.361060603))
            Line((-21.810706275, -39.361060603), (-28.43159427, -39.361060603))
        make_face(mode=Mode.SUBTRACT)
    extrude(amount=BOSS_EXTRUDE4_DEPTH)


with BuildPart() as part_1:
    # Scale1: scaled about (-1e-09, 0.224288637, 95.374877124)
    add(part.part.scale(SCALE1_SCALE).moved(Location((1.5e-08, -3.2746141, -1392.47320601))))


with BuildPart() as part_2:
    # Scale2: scaled about (-5e-09, 0.224288632, 95.374877131)
    add(part_1.part.scale(SCALE2_SCALE).moved(Location((-3e-09, 0.112144316, 47.687438566))))


solid = part_2.part
